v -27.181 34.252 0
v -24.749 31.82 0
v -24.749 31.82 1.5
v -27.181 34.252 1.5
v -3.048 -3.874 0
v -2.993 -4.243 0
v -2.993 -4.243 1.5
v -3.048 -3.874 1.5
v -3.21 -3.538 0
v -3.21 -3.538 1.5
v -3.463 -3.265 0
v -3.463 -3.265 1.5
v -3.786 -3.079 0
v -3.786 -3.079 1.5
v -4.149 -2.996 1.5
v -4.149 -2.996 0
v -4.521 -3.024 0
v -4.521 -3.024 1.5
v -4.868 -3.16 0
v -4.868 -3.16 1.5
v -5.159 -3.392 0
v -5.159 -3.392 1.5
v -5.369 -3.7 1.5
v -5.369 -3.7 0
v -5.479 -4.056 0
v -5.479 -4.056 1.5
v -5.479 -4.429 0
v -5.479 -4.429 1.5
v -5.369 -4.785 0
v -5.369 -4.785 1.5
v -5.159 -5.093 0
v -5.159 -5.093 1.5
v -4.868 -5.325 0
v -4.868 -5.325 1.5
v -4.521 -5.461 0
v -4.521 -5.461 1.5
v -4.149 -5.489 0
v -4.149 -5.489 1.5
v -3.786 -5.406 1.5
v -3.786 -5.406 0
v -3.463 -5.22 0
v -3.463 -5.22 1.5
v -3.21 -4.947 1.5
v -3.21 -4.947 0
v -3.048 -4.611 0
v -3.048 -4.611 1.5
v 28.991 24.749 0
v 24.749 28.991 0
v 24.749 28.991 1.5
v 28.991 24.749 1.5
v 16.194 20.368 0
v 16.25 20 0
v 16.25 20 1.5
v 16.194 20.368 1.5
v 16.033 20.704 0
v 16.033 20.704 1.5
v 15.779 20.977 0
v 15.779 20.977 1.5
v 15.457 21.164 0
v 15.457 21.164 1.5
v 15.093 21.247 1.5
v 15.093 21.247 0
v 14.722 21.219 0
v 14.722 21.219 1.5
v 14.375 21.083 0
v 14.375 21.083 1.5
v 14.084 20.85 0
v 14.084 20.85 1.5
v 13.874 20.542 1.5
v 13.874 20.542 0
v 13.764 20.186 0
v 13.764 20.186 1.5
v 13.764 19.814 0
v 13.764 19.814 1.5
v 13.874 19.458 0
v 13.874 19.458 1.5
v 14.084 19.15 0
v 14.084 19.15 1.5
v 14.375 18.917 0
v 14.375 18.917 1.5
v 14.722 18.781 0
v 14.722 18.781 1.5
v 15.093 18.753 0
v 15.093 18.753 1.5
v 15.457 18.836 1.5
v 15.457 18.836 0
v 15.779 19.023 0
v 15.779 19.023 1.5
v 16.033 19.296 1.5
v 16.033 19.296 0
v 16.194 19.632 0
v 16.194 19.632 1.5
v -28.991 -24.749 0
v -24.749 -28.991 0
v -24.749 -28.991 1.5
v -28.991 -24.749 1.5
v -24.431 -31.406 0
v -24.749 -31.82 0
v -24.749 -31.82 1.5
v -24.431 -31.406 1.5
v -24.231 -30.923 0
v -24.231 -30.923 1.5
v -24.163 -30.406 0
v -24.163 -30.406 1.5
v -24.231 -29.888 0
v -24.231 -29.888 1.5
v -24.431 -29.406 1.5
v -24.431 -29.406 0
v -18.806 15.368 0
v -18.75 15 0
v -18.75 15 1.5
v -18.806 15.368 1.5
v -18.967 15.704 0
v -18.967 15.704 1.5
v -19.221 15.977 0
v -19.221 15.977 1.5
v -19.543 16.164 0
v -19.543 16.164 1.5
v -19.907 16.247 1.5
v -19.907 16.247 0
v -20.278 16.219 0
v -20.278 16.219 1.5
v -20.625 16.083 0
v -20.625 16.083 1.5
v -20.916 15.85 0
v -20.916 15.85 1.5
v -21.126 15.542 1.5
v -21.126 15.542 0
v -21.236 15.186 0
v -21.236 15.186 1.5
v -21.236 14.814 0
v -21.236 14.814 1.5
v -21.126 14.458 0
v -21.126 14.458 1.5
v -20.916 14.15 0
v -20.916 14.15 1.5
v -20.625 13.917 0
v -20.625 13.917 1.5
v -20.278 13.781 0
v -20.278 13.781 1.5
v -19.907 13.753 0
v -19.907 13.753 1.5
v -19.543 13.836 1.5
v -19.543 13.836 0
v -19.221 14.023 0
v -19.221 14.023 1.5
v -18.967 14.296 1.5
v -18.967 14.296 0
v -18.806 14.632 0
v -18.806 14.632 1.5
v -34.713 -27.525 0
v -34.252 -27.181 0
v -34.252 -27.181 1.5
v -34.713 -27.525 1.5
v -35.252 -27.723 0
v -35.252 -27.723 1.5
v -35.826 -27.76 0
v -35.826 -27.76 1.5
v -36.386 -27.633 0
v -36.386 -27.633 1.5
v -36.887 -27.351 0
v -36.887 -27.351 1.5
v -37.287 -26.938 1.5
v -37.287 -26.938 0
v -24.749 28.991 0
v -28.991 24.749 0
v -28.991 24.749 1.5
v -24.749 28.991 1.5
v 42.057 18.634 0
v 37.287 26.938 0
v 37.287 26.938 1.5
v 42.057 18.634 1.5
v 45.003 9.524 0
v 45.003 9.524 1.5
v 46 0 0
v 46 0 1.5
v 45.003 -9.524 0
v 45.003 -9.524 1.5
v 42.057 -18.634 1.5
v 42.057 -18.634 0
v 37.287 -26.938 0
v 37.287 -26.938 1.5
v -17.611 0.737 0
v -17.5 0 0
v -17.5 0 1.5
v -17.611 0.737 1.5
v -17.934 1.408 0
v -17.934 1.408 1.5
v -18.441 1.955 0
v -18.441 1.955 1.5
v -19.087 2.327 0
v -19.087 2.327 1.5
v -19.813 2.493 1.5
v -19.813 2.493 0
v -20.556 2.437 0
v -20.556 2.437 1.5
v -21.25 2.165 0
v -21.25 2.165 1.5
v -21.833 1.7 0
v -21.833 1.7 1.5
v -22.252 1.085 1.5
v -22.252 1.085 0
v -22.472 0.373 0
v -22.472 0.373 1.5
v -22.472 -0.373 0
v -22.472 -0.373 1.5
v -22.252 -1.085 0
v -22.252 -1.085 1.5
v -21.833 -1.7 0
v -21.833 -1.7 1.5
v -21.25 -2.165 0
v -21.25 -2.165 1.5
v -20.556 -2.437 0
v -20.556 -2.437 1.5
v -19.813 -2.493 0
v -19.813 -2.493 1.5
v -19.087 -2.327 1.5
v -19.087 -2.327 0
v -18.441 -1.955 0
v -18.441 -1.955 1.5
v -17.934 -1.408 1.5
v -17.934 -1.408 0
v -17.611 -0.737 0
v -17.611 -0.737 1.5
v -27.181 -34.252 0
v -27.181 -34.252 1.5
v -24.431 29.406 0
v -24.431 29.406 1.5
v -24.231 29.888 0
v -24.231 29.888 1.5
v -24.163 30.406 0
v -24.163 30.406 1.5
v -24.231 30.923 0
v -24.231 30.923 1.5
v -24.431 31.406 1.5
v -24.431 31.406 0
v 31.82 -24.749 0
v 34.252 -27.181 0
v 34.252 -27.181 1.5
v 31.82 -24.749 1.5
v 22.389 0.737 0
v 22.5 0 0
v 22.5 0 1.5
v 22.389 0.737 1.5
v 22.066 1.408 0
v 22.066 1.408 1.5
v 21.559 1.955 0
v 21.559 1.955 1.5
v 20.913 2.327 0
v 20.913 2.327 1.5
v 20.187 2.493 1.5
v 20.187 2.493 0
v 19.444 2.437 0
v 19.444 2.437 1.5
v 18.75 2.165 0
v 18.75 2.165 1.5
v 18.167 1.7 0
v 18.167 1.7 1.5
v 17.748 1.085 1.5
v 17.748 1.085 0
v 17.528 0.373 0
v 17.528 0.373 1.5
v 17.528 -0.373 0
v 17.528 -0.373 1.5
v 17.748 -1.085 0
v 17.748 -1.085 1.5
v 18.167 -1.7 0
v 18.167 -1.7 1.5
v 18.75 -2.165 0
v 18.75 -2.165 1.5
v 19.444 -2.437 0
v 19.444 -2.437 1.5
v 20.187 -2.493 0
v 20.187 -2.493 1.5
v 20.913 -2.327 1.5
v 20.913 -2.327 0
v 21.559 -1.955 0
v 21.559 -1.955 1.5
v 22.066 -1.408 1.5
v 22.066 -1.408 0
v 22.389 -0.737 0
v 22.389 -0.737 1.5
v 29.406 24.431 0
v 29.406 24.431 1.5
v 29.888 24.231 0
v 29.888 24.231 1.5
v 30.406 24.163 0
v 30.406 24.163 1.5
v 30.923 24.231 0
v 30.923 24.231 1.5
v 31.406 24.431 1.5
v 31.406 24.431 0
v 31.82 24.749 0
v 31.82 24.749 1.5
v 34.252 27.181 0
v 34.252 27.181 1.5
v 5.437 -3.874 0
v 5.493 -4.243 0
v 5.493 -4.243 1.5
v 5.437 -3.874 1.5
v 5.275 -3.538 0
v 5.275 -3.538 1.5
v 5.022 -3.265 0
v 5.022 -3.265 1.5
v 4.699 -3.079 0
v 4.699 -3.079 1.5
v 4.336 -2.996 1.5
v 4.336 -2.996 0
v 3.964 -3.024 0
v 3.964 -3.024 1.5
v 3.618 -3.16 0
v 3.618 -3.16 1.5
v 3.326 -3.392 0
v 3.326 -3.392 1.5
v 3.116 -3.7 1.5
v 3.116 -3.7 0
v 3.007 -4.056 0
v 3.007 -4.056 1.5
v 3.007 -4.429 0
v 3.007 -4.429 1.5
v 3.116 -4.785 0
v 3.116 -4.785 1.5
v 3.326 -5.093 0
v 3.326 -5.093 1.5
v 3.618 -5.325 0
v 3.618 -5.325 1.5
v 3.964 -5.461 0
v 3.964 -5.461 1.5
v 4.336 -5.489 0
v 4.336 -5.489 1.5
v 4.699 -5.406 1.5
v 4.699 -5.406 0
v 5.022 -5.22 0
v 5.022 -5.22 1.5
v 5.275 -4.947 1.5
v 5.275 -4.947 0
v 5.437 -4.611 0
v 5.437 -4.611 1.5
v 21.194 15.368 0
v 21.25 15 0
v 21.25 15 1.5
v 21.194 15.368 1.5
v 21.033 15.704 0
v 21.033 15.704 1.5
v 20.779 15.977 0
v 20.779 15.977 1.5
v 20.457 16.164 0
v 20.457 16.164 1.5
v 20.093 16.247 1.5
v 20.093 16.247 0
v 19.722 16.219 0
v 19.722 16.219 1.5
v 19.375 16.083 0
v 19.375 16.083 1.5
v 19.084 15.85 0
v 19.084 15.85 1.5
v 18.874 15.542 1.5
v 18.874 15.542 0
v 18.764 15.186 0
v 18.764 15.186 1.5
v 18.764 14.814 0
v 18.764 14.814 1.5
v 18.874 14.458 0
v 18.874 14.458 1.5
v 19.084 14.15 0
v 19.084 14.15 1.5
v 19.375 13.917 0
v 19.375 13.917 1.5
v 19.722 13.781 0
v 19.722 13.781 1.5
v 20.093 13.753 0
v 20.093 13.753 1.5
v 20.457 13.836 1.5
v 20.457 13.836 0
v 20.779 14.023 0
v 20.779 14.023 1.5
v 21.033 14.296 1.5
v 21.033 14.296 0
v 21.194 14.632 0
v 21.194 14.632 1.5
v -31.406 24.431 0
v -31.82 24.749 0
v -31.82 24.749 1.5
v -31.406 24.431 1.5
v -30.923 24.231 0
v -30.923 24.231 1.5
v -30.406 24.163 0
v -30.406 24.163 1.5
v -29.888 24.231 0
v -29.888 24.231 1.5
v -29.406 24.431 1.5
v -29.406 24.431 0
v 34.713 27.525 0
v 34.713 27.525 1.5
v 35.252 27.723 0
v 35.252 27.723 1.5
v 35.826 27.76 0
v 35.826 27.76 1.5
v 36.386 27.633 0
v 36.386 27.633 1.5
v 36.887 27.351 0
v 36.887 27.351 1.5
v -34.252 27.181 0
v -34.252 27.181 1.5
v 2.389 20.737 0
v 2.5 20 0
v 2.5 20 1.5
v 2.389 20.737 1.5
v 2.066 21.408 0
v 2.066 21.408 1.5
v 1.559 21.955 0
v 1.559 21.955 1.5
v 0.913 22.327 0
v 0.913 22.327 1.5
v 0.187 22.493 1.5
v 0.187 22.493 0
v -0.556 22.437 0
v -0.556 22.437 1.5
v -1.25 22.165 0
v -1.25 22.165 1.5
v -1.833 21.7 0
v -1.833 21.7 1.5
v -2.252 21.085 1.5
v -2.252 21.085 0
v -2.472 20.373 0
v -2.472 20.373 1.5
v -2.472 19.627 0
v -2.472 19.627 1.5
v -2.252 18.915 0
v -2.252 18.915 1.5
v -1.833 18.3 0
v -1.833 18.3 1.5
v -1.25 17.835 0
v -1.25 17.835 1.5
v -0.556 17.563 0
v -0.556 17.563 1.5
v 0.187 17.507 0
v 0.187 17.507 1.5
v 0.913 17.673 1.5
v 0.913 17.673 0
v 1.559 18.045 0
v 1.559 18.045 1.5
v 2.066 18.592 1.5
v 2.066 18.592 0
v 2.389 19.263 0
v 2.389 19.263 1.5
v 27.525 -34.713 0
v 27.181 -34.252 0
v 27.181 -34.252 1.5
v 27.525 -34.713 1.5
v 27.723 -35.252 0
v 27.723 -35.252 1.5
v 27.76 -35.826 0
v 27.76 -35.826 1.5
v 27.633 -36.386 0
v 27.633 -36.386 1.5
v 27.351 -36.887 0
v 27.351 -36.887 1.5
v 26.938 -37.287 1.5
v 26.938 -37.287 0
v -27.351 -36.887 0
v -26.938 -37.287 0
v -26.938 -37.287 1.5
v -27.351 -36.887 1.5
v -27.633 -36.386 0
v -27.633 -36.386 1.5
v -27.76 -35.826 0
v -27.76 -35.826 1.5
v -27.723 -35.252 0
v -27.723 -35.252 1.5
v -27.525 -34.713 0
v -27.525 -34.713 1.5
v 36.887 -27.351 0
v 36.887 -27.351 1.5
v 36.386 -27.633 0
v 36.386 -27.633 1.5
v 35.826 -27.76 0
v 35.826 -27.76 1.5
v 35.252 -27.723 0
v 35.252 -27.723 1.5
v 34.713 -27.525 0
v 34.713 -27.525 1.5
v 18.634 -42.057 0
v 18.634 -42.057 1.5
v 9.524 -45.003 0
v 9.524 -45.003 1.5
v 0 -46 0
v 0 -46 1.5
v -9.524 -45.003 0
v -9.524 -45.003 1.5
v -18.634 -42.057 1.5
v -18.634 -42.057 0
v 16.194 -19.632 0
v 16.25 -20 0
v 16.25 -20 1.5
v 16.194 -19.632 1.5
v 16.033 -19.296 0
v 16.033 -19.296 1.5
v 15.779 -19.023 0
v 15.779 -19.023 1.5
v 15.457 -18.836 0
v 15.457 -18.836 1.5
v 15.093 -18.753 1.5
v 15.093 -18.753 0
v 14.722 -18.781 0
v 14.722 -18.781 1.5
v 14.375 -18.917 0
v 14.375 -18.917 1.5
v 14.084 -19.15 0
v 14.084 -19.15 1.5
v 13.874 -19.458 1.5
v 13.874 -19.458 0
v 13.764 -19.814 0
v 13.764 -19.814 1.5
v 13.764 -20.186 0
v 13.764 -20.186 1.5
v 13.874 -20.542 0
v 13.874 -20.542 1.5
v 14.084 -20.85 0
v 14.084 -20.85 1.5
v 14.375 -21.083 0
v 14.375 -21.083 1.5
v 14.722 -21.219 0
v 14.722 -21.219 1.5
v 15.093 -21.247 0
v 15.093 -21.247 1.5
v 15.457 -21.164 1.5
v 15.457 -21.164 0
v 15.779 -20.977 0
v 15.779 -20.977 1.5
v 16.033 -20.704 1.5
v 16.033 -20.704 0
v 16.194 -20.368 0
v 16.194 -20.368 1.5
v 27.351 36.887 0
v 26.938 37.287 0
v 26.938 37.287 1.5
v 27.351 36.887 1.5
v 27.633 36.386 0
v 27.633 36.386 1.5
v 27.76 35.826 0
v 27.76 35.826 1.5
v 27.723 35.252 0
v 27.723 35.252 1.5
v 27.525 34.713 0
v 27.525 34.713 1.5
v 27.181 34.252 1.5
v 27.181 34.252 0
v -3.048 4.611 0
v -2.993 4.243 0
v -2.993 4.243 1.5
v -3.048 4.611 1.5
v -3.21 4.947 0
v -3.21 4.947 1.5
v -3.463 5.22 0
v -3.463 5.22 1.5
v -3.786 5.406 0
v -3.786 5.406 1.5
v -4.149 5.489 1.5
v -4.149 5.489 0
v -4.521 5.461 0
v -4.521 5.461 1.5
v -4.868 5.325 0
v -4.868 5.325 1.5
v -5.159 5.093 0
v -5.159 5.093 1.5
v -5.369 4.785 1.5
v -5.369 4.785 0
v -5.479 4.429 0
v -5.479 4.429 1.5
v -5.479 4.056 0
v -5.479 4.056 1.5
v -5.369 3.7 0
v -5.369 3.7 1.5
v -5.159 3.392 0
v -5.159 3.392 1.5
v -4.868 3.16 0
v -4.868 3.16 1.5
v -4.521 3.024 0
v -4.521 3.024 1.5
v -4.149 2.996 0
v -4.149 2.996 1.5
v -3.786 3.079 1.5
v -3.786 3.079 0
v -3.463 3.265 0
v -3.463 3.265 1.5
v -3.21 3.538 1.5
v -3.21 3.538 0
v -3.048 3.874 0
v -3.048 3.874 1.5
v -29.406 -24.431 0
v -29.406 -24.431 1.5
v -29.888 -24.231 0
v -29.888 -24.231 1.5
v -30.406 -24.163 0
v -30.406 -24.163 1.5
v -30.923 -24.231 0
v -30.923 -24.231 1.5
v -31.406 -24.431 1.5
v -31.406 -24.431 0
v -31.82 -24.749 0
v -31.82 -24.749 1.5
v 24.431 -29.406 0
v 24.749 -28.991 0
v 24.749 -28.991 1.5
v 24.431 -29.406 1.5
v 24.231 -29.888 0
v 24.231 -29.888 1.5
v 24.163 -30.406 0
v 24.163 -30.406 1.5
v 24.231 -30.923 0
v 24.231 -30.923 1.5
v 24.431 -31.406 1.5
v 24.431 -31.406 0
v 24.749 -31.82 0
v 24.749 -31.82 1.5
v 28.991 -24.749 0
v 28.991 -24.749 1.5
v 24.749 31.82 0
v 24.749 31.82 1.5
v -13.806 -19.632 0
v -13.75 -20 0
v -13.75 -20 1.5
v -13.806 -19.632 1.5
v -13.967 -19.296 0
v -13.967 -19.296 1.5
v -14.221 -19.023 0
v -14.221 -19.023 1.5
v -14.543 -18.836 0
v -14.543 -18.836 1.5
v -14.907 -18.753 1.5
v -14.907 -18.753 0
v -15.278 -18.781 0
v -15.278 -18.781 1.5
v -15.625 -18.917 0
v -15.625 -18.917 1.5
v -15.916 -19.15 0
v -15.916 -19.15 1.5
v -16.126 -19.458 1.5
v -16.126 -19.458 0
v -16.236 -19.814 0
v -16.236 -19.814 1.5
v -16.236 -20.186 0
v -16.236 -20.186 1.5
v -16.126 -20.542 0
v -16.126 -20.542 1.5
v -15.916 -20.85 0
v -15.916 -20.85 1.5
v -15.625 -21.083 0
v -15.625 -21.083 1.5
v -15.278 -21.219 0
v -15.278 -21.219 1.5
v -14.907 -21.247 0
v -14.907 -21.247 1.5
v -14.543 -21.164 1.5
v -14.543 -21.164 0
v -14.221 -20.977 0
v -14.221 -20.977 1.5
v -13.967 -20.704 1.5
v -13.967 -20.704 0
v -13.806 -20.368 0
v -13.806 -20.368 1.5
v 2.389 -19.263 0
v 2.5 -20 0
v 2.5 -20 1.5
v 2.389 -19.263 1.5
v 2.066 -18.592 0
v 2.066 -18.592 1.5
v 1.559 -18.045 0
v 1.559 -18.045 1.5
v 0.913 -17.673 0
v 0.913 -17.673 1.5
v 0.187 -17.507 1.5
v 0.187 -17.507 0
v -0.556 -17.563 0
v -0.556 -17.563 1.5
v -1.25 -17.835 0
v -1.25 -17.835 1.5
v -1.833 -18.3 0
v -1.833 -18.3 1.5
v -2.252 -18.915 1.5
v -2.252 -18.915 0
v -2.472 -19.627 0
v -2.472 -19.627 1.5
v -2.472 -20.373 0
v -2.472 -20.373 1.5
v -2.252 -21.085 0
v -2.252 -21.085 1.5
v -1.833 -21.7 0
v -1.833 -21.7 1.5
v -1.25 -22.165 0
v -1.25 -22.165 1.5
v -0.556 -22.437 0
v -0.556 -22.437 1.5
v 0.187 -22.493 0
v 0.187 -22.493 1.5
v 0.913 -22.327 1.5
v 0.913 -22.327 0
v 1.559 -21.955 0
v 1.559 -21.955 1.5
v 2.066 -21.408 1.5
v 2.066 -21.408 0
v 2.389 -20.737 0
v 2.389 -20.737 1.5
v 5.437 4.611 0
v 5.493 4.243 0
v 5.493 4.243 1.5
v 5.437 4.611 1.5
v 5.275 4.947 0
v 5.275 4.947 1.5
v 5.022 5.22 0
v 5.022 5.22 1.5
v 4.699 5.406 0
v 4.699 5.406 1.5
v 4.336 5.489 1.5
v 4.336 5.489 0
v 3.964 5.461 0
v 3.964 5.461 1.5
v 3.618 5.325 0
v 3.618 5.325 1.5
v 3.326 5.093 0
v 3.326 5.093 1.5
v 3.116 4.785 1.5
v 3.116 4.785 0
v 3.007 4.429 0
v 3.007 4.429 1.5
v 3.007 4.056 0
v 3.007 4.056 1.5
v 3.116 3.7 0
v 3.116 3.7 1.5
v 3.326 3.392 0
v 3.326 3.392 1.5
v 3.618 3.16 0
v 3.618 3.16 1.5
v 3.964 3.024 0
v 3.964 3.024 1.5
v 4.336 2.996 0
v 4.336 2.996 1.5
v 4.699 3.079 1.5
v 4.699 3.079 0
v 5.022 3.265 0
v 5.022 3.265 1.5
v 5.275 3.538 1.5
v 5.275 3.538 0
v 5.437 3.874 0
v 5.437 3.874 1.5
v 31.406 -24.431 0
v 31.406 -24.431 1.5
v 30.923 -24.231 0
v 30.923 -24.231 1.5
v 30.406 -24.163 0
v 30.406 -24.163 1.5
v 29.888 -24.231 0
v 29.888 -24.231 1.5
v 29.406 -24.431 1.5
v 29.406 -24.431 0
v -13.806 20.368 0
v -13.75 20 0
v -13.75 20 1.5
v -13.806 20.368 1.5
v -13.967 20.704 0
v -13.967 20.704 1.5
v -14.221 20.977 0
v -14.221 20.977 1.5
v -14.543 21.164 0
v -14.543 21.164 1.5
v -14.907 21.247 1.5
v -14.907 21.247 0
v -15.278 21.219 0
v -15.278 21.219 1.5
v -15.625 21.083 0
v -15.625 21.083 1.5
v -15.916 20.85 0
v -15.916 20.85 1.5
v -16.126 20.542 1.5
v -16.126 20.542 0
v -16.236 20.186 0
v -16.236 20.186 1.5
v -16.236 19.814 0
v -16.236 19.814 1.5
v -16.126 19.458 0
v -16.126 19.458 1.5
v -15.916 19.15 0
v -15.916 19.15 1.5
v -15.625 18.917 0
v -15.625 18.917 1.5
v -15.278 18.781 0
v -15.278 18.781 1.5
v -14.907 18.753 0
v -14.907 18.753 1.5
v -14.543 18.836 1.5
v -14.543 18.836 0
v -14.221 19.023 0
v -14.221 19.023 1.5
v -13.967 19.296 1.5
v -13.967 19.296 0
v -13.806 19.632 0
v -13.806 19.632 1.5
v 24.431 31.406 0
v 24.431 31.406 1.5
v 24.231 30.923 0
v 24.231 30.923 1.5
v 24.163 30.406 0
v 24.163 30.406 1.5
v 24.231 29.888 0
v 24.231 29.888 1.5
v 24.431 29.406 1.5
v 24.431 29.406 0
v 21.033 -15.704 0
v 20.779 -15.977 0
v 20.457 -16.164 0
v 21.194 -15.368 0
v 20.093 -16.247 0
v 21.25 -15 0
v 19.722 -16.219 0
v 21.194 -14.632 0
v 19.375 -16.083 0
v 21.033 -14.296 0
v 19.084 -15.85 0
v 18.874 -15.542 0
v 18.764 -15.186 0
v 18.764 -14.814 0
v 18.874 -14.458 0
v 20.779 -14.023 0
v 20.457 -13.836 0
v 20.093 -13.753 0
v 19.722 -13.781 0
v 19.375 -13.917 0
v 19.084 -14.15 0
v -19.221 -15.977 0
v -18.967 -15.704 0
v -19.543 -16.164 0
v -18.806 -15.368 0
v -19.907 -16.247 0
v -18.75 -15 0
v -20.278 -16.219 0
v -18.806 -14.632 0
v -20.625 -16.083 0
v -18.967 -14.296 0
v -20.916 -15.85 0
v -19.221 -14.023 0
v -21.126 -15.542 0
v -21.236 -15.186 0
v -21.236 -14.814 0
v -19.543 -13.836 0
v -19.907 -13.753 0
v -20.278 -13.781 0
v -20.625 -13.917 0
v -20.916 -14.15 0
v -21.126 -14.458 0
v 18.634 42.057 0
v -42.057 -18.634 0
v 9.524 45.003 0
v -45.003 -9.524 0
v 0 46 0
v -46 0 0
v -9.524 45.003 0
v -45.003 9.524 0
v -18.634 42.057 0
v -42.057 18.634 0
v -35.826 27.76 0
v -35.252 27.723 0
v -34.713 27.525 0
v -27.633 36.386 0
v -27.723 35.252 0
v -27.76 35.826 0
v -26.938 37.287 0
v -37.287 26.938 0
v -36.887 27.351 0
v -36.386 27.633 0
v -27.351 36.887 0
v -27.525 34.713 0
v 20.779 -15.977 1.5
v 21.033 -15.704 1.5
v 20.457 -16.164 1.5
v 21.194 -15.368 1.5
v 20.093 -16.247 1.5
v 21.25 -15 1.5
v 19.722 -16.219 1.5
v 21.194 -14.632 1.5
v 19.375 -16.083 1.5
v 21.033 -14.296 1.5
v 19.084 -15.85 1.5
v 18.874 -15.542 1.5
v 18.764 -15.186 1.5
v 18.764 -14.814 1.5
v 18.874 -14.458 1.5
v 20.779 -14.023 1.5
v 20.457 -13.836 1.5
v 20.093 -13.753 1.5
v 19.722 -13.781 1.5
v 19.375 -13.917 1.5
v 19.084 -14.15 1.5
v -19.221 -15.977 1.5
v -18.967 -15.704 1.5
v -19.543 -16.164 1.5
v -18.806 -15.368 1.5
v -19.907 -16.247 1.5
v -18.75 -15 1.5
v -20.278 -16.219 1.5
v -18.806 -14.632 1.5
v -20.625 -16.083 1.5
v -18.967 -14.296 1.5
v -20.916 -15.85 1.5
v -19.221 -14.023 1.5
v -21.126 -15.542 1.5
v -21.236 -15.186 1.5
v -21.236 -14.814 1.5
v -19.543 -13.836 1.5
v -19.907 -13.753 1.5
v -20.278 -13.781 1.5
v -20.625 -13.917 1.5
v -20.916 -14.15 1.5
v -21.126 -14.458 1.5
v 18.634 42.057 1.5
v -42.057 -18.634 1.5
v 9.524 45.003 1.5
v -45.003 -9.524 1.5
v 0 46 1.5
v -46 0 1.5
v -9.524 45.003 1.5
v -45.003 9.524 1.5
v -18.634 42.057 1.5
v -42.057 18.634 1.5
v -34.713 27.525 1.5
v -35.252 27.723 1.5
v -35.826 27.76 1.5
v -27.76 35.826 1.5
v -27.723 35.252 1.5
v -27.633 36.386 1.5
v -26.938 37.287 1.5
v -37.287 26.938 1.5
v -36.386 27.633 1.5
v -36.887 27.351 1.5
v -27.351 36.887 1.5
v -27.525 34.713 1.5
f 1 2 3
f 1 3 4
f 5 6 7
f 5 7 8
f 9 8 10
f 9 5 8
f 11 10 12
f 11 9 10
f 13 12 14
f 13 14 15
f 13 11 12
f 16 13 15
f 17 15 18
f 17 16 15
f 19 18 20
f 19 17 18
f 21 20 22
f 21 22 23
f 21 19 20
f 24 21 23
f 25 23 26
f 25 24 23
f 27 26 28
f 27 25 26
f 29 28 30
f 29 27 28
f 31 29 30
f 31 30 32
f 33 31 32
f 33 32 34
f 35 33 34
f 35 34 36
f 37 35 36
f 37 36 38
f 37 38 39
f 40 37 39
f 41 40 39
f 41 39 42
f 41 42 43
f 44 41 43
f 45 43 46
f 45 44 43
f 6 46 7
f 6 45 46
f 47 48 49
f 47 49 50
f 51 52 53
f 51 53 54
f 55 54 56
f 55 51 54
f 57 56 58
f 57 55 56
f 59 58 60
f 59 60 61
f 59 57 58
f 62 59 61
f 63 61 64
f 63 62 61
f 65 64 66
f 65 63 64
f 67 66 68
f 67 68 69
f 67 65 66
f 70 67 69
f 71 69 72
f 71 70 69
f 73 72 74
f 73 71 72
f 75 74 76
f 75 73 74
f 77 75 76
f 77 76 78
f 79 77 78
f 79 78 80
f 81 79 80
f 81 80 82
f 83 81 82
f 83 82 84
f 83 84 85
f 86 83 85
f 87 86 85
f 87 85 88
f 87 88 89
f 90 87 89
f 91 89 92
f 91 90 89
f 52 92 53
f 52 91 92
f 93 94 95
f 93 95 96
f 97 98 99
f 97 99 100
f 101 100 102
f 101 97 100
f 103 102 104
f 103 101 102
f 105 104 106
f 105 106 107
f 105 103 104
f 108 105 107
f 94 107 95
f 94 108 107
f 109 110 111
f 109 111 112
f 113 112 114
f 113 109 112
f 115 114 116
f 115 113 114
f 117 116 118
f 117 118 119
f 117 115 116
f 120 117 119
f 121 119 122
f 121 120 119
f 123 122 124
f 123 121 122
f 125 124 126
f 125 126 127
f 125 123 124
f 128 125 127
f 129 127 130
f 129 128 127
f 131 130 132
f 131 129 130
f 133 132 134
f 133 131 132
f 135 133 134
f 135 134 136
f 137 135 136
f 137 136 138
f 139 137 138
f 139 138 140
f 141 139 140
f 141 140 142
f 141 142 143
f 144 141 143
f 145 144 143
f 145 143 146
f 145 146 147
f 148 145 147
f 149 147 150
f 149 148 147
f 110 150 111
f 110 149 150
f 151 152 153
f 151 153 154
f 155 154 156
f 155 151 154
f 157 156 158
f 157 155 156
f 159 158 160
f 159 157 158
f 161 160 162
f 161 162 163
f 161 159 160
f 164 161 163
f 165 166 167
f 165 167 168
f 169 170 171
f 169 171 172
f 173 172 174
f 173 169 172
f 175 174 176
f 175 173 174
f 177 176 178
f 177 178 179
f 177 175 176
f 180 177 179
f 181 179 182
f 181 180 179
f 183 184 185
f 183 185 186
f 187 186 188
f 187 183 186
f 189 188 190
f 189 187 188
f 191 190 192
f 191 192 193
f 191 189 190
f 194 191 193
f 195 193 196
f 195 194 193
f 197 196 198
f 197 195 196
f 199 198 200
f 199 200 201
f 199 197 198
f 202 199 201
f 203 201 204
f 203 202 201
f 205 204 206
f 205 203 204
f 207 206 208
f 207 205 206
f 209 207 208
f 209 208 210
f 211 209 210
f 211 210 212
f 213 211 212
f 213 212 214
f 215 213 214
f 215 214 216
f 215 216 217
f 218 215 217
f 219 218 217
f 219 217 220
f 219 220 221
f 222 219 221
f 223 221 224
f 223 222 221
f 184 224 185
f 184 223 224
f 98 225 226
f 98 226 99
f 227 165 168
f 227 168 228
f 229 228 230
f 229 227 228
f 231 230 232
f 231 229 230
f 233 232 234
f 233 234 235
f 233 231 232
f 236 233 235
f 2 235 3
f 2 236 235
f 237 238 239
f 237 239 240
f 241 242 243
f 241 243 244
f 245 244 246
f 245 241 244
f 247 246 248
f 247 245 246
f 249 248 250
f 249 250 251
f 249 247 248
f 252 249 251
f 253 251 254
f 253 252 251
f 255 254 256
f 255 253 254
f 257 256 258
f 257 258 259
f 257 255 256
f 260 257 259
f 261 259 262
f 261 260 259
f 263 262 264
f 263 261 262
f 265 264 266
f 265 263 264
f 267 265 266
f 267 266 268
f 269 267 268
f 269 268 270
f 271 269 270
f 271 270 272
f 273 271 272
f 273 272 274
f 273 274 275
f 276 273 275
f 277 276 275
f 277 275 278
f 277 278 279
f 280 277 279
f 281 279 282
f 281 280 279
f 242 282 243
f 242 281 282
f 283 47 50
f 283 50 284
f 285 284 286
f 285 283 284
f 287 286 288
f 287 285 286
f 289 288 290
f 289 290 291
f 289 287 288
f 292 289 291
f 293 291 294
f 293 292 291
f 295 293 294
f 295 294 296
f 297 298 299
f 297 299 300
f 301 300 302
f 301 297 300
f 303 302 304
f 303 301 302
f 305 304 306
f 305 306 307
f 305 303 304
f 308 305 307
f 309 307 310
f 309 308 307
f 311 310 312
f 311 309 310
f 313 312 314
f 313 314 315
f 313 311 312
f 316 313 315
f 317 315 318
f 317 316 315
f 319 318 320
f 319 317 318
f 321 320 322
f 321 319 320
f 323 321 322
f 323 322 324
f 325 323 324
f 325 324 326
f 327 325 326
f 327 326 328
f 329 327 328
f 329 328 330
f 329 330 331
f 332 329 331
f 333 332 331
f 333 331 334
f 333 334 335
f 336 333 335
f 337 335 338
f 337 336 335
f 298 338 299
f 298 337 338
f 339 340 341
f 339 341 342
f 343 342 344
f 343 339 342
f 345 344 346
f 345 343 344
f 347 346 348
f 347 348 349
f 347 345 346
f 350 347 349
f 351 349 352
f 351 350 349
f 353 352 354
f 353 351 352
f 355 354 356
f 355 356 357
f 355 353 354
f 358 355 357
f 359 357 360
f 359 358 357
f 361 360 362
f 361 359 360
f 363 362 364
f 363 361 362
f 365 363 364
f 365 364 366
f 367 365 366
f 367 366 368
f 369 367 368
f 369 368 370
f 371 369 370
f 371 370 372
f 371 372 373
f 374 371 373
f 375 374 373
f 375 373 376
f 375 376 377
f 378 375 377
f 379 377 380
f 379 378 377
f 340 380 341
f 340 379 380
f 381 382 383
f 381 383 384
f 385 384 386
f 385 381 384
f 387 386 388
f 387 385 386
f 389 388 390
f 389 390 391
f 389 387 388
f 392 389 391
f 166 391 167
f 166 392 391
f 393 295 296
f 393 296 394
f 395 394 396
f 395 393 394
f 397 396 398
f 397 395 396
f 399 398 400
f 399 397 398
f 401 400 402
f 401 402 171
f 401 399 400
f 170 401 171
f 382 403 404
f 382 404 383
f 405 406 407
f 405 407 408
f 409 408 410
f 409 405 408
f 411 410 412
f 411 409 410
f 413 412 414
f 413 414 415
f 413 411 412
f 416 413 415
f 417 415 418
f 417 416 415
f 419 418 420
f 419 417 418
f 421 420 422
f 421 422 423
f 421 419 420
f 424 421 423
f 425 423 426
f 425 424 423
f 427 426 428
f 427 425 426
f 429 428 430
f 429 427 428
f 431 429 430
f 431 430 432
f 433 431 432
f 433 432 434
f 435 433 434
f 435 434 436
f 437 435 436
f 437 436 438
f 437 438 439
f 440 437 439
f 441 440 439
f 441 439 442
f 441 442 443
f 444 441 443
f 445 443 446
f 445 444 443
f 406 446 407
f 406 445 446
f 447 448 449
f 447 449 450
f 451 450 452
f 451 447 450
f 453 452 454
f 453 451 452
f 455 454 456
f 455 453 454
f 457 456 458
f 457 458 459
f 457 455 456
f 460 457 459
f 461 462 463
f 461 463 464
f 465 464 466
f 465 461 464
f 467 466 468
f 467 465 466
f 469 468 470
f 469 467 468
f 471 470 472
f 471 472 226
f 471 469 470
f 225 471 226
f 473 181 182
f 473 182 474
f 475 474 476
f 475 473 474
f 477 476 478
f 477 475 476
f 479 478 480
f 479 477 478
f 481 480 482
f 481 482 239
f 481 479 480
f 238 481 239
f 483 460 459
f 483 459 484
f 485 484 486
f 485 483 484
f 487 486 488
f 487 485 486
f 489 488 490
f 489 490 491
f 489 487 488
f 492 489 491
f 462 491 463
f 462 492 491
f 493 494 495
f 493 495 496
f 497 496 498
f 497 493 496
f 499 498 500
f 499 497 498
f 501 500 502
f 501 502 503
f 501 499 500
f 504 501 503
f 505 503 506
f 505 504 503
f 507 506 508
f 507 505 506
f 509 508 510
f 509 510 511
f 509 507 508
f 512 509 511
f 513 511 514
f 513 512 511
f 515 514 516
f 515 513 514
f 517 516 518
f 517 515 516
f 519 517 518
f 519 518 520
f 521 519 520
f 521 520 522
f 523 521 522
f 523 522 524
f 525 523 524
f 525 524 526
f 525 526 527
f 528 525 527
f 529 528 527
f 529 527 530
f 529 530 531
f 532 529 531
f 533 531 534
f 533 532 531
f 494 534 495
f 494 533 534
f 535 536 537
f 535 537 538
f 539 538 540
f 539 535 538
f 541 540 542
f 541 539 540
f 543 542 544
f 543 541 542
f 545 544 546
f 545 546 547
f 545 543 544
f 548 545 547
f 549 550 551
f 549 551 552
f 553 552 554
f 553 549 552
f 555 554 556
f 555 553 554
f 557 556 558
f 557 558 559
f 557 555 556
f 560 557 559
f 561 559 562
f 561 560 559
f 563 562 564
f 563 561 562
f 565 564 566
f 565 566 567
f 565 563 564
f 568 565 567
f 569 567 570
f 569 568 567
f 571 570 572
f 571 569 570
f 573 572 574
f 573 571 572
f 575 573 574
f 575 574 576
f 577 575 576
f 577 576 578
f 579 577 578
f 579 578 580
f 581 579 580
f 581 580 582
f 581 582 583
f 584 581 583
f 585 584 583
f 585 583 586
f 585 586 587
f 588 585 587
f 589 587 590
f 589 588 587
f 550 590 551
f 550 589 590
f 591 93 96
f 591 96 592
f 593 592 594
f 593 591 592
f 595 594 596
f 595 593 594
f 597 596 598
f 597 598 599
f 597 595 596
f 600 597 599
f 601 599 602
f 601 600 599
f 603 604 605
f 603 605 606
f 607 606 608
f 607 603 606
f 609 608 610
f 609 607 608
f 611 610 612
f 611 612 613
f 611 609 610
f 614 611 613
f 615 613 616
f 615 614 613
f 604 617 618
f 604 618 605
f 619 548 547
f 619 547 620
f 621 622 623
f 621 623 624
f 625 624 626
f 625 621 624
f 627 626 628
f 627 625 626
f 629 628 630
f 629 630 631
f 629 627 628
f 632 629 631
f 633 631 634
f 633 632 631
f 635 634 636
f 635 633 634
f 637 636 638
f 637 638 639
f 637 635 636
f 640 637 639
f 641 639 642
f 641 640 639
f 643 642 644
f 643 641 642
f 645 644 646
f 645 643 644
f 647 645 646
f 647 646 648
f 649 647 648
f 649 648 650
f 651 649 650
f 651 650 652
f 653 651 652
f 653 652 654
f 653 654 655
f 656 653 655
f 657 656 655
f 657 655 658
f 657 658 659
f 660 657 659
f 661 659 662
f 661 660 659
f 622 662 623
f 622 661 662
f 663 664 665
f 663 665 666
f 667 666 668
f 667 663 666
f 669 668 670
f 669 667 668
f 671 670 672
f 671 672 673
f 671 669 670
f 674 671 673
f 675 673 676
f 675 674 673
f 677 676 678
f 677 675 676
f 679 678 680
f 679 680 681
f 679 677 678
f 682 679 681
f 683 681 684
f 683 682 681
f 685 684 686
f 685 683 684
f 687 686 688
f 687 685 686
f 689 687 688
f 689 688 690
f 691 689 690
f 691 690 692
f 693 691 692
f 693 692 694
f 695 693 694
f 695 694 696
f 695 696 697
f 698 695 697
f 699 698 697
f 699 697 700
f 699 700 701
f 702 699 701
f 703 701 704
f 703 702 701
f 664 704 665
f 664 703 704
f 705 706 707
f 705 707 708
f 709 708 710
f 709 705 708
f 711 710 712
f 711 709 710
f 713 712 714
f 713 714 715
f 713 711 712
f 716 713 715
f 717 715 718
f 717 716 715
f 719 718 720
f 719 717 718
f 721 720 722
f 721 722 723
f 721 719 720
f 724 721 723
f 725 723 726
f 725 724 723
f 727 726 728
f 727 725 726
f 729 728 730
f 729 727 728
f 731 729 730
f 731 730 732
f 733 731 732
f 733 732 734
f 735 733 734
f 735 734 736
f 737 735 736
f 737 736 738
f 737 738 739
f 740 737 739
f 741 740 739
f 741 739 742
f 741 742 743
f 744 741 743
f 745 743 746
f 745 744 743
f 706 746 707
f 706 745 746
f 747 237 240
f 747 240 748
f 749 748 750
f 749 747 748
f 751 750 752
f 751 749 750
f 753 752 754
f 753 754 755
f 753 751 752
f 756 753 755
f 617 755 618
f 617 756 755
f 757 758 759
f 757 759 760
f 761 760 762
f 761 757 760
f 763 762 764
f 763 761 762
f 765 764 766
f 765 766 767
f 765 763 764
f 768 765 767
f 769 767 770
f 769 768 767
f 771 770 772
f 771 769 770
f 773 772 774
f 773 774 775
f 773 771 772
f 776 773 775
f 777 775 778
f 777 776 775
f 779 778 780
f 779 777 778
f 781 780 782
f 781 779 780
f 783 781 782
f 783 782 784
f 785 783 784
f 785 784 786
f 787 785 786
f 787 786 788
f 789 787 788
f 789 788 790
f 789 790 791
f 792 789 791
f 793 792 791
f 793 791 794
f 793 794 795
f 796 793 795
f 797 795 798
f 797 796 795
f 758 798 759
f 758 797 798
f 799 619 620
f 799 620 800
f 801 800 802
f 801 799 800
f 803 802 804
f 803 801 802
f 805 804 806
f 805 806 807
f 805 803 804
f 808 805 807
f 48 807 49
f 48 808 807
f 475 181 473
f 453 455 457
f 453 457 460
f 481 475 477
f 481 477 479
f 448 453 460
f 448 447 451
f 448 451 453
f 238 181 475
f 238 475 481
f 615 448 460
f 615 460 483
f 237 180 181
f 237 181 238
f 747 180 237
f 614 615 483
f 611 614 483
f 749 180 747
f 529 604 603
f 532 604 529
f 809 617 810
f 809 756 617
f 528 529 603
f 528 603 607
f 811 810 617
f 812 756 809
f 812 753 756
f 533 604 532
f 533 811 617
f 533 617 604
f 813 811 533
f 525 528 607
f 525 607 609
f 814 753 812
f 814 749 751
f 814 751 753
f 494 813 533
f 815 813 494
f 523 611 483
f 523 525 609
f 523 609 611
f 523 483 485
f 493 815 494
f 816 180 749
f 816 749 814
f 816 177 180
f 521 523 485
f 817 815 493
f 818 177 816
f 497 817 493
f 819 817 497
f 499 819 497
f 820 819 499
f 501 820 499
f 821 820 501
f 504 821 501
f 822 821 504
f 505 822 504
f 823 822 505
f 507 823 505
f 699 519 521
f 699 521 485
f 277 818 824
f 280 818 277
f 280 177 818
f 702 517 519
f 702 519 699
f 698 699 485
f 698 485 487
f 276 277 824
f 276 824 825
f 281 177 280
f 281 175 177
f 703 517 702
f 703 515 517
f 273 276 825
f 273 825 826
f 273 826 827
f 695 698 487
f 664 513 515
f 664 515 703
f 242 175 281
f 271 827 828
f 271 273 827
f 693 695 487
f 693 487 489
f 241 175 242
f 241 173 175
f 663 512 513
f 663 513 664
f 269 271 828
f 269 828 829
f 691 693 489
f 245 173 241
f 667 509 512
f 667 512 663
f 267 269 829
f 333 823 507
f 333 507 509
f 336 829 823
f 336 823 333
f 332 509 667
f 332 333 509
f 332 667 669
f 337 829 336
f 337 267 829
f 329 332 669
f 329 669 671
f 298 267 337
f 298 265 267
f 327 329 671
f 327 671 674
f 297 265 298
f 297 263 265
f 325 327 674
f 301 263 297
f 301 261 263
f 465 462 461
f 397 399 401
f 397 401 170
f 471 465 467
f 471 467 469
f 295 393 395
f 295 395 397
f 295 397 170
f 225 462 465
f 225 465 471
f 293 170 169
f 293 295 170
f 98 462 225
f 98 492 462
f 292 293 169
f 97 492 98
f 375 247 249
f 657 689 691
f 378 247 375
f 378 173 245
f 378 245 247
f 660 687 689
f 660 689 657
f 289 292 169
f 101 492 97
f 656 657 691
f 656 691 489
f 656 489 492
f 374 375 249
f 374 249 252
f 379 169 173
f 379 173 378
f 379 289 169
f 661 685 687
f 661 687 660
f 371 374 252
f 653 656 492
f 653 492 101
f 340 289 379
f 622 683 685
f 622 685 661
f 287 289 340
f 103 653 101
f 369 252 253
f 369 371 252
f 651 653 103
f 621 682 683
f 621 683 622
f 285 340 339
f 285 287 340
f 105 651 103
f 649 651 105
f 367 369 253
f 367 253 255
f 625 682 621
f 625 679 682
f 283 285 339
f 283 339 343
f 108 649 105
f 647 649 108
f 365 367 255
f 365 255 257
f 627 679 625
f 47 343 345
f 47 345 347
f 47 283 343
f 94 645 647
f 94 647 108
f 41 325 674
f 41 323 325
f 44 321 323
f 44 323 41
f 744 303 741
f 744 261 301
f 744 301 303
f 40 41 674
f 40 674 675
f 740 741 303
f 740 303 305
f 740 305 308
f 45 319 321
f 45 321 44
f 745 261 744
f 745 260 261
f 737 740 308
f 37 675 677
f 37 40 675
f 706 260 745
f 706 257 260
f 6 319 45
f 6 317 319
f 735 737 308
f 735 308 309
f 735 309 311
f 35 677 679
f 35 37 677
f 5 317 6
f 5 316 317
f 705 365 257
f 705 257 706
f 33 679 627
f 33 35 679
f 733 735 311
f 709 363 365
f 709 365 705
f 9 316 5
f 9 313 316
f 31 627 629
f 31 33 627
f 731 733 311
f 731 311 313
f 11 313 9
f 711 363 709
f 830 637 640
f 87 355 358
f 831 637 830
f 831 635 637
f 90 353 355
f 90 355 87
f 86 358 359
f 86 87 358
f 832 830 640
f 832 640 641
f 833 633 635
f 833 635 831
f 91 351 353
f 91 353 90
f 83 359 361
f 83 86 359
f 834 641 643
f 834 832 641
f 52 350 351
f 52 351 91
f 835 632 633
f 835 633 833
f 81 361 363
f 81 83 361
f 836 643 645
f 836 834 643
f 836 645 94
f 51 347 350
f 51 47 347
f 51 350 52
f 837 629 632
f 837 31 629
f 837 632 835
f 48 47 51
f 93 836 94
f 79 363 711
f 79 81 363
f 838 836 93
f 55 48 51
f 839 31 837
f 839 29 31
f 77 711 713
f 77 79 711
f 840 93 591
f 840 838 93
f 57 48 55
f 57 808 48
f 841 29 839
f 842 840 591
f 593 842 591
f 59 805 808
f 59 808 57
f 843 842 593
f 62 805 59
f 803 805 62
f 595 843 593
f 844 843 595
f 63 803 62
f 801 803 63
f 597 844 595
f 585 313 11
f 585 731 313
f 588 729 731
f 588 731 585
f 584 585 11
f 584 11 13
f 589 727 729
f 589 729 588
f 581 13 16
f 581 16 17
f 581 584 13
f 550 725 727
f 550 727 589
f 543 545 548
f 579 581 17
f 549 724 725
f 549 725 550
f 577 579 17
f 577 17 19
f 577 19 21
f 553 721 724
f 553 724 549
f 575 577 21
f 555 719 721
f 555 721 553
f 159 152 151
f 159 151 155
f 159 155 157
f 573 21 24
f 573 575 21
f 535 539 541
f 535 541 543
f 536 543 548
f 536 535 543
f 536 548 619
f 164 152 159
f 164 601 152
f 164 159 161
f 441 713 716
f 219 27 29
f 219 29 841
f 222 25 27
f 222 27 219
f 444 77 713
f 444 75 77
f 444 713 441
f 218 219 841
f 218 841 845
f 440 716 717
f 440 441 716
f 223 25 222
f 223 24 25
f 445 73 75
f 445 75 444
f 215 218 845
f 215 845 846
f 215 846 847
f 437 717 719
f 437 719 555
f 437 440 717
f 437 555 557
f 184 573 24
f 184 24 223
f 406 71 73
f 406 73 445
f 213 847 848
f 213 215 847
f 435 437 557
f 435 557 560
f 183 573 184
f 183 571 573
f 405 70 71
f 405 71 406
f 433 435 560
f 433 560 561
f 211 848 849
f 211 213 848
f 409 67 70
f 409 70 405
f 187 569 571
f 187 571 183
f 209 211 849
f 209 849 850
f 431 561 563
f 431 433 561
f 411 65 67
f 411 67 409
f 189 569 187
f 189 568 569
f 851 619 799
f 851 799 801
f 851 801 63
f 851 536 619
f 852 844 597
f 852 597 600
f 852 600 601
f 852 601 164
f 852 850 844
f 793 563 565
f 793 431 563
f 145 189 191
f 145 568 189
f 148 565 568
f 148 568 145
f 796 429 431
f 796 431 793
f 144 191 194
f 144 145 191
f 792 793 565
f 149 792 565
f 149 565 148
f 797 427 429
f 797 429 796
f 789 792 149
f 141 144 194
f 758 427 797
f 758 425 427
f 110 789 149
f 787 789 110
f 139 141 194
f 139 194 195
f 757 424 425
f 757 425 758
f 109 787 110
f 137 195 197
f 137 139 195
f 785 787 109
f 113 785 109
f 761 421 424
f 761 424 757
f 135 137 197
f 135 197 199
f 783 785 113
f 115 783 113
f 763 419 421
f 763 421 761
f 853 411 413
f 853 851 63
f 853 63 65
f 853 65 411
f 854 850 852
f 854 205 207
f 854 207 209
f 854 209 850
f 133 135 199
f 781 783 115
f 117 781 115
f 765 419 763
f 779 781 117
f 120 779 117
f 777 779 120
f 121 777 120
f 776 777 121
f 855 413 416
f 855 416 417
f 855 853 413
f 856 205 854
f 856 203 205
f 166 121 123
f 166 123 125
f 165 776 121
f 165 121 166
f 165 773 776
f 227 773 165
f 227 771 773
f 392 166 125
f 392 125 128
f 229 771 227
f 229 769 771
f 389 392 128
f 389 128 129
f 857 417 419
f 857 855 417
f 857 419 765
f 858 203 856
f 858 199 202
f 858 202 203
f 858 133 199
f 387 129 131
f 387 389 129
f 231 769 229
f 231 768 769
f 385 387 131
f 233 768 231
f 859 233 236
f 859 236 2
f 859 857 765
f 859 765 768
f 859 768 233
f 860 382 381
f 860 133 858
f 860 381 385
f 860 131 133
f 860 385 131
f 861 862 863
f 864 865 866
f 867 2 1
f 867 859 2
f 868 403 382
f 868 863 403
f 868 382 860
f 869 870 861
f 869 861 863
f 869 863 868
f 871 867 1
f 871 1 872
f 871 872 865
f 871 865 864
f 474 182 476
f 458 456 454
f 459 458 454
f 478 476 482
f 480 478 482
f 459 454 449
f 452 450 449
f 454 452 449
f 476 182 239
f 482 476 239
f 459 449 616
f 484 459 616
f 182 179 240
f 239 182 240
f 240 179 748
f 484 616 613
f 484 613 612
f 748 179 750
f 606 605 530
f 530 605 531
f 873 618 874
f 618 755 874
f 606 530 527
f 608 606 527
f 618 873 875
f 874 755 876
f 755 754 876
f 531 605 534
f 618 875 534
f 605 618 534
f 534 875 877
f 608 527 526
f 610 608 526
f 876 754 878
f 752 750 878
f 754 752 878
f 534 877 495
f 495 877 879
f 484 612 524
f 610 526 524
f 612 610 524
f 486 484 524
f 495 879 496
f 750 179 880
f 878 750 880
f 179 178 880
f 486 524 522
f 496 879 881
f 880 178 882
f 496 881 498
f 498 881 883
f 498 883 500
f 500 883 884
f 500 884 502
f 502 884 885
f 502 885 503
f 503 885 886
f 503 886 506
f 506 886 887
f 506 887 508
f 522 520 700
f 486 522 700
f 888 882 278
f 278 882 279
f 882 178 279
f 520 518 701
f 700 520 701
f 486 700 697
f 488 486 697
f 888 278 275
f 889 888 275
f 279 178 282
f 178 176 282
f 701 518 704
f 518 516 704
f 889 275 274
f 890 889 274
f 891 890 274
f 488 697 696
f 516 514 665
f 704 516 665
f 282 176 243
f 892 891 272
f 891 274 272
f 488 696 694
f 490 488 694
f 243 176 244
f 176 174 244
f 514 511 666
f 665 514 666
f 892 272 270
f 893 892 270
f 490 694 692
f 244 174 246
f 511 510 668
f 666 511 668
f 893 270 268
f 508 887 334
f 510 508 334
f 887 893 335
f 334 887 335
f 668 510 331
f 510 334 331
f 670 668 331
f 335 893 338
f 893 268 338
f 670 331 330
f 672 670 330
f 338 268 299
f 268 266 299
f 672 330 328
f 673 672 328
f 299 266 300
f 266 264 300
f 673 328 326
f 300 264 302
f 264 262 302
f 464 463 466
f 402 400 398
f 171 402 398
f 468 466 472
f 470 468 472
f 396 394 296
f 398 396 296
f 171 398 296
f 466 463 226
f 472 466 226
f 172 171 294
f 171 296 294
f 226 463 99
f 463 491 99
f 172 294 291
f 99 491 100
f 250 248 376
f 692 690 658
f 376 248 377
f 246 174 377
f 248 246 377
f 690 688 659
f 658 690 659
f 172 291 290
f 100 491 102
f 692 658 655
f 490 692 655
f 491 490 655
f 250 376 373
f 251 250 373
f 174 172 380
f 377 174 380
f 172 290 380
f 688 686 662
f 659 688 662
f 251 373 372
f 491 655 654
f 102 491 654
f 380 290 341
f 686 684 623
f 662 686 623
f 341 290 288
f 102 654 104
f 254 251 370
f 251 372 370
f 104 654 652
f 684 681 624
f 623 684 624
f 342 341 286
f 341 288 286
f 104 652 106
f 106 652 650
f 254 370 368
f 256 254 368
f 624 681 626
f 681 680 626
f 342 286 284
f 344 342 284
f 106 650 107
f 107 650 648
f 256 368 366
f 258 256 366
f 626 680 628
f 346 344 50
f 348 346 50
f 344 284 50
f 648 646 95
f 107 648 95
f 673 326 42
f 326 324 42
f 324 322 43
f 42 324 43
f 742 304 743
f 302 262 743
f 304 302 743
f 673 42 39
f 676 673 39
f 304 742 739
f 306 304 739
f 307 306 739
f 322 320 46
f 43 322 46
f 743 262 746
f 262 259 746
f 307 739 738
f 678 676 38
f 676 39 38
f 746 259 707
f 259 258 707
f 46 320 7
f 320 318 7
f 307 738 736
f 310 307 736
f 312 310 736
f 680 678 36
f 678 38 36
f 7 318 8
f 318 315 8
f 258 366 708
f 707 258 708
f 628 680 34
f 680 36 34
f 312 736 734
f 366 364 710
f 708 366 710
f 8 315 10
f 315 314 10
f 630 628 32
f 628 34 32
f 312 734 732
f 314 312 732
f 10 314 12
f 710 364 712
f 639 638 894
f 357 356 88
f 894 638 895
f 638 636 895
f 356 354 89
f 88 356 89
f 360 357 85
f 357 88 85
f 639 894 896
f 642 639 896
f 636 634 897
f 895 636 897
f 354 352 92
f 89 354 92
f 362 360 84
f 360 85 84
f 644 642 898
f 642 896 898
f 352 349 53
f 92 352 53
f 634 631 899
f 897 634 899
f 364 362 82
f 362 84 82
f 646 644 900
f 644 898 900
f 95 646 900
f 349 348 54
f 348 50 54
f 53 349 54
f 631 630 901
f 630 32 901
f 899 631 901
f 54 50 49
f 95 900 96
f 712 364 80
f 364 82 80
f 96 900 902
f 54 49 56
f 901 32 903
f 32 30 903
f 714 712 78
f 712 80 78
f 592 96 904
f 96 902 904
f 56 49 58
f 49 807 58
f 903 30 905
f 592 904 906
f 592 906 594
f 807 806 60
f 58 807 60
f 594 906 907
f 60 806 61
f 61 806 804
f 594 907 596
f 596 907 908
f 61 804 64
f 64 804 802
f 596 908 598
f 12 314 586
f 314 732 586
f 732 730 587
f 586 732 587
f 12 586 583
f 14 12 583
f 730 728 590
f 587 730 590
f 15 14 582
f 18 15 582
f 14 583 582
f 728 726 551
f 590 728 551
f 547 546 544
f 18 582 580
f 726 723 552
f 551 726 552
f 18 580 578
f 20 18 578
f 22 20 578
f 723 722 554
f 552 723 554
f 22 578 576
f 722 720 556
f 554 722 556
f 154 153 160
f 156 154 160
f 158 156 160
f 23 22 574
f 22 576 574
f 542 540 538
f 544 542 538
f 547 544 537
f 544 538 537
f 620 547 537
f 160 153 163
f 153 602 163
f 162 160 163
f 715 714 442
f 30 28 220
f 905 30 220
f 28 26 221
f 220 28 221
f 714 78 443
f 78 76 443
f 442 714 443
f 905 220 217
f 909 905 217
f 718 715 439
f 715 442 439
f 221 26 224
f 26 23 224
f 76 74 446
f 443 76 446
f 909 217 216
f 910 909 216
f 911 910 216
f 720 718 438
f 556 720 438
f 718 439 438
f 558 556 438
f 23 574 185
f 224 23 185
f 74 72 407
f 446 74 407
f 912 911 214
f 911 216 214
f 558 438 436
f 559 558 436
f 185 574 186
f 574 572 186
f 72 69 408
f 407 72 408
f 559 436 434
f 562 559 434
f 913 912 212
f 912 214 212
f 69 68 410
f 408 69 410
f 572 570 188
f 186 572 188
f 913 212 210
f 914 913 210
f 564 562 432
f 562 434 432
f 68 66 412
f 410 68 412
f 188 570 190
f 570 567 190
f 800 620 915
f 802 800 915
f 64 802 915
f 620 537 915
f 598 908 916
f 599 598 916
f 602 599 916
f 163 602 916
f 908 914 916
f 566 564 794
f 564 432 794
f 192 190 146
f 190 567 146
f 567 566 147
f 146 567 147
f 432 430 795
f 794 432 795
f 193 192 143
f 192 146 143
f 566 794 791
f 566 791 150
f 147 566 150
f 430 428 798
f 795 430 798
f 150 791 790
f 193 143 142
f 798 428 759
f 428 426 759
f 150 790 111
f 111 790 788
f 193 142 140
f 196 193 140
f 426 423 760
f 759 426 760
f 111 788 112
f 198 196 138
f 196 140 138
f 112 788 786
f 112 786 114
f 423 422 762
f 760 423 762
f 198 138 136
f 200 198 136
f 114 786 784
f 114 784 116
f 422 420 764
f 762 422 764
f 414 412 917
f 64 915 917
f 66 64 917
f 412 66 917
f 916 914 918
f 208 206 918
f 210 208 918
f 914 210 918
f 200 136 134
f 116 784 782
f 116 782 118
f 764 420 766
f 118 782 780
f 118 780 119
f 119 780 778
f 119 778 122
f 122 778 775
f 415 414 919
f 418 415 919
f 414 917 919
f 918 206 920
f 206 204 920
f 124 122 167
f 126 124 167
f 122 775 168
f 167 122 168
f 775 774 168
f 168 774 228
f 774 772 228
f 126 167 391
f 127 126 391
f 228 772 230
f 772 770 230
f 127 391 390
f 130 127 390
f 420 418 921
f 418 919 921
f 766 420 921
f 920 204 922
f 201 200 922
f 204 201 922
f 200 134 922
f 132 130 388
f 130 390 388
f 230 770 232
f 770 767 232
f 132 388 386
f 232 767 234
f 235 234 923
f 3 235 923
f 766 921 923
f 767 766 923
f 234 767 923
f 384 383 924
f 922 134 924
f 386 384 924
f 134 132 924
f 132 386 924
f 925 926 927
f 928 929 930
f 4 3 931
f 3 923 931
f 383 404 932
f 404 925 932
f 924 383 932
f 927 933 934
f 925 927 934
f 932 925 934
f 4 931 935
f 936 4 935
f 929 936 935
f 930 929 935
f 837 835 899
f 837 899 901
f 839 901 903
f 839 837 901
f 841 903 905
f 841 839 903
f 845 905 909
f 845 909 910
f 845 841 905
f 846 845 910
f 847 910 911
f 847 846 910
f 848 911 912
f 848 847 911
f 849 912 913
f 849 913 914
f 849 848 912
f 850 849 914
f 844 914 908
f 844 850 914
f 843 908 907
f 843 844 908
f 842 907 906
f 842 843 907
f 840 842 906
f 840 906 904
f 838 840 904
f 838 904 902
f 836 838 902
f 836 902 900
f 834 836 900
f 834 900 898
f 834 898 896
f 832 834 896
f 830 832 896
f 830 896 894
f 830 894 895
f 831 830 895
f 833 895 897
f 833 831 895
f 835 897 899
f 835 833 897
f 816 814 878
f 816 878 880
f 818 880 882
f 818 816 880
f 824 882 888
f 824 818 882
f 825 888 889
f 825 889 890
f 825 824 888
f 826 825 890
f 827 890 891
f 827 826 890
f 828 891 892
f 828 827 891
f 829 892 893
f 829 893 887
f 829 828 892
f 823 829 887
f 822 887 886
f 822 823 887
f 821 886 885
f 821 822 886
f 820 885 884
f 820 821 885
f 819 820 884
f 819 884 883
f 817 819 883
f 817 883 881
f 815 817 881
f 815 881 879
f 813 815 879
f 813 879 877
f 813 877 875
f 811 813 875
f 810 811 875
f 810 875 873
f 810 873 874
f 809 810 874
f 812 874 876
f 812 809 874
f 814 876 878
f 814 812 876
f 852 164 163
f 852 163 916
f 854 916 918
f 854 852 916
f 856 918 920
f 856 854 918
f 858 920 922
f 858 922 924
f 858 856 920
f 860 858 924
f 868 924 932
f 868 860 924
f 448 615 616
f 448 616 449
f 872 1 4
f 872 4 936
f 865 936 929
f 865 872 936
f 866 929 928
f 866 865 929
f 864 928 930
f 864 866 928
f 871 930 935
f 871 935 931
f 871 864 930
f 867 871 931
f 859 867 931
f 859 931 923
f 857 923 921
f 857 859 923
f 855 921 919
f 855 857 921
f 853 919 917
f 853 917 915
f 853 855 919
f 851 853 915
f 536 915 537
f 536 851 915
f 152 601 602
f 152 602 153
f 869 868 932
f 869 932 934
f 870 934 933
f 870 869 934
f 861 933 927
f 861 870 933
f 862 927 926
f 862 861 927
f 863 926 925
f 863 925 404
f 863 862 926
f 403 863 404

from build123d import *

# Parameters (mm, degrees)
SKETCH5_R           = 2.5
SKETCH5_R_2         = 1.25
BOSS_EXTRUDE1_DEPTH = 1.5


with BuildPart() as part:
    # Sketch5 → Boss-Extrude1 (new body)
    with BuildSketch(Plane.XY):
        with BuildLine():
            Line((-34.251979013, 27.180911201), (-31.819805153, 24.748737342))
            ThreePointArc((-31.819805153, 24.748737342), (-30.405591591, 24.162950904), (-28.991378029, 24.748737342))
            Line((-28.991378029, 24.748737342), (-24.748737342, 28.991378029))
            ThreePointArc((-24.748737342, 28.991378029), (-24.162950904, 30.405591591), (-24.748737342, 31.819805153))
            Line((-24.748737342, 31.819805153), (-27.180911201, 34.251979013))
            ThreePointArc((-27.180911201, 34.251979013), (-27.760319437, 35.825792464), (-26.937911168, 37.287383147))
            ThreePointArc((-26.937911168, 37.287383147), (0, 46), (26.937911168, 37.287383147))
            ThreePointArc((26.937911168, 37.287383147), (27.760319437, 35.825792464), (27.180911201, 34.251979013))
            Line((27.180911201, 34.251979013), (24.748737342, 31.819805153))
            ThreePointArc((24.748737342, 31.819805153), (24.162950904, 30.405591591), (24.748737342, 28.991378029))
            Line((24.748737342, 28.991378029), (28.991378029, 24.748737342))
            ThreePointArc((28.991378029, 24.748737342), (30.405591591, 24.162950904), (31.819805153, 24.748737342))
            Line((31.819805153, 24.748737342), (34.251979013, 27.180911201))
            ThreePointArc((34.251979013, 27.180911201), (35.825792464, 27.760319437), (37.287383147, 26.937911168))
            ThreePointArc((37.287383147, 26.937911168), (46, 0), (37.287383147, -26.937911168))
            ThreePointArc((37.287383147, -26.937911168), (35.825792464, -27.760319437), (34.251979013, -27.180911201))
            Line((34.251979013, -27.180911201), (31.819805153, -24.748737342))
            ThreePointArc((31.819805153, -24.748737342), (30.405591591, -24.162950904), (28.991378029, -24.748737342))
            Line((28.991378029, -24.748737342), (24.748737342, -28.991378029))
            ThreePointArc((24.748737342, -28.991378029), (24.162950904, -30.405591591), (24.748737342, -31.819805153))
            Line((24.748737342, -31.819805153), (27.180911201, -34.251979013))
            ThreePointArc((27.180911201, -34.251979013), (27.760319437, -35.825792464), (26.937911168, -37.287383147))
            ThreePointArc((26.937911168, -37.287383147), (0, -46), (-26.937911168, -37.287383147))
            ThreePointArc((-26.937911168, -37.287383147), (-27.760319437, -35.825792464), (-27.180911201, -34.251979013))
            Line((-27.180911201, -34.251979013), (-24.748737342, -31.819805153))
            ThreePointArc((-24.748737342, -31.819805153), (-24.162950904, -30.405591591), (-24.748737342, -28.991378029))
            Line((-24.748737342, -28.991378029), (-28.991378029, -24.748737342))
            ThreePointArc((-28.991378029, -24.748737342), (-30.405591591, -24.162950904), (-31.819805153, -24.748737342))
            Line((-31.819805153, -24.748737342), (-34.251979013, -27.180911201))
            ThreePointArc((-34.251979013, -27.180911201), (-35.825792464, -27.760319437), (-37.287383147, -26.937911168))
            ThreePointArc((-37.287383147, -26.937911168), (-46, 0), (-37.287383147, 26.937911168))
            ThreePointArc((-37.287383147, 26.937911168), (-35.825792464, 27.760319437), (-34.251979013, 27.180911201))
        make_face()
        with Locations((-20, 0)):
            Circle(SKETCH5_R, mode=Mode.SUBTRACT)
        with Locations((-20, 15)):
            Circle(SKETCH5_R_2, mode=Mode.SUBTRACT)
        with Locations((-20, -15)):
            Circle(SKETCH5_R_2, mode=Mode.SUBTRACT)
        with Locations((-15, -20)):
            Circle(SKETCH5_R_2, mode=Mode.SUBTRACT)
        with Locations((0, -20)):
            Circle(SKETCH5_R, mode=Mode.SUBTRACT)
        with Locations((15, -20)):
            Circle(SKETCH5_R_2, mode=Mode.SUBTRACT)
        with Locations((20, -15)):
            Circle(SKETCH5_R_2, mode=Mode.SUBTRACT)
        with Locations((20, 0)):
            Circle(SKETCH5_R, mode=Mode.SUBTRACT)
        with Locations((20, 15)):
            Circle(SKETCH5_R_2, mode=Mode.SUBTRACT)
        with Locations((15, 20)):
            Circle(SKETCH5_R_2, mode=Mode.SUBTRACT)
        with Locations((0, 20)):
            Circle(SKETCH5_R, mode=Mode.SUBTRACT)
        with Locations((-15, 20)):
            Circle(SKETCH5_R_2, mode=Mode.SUBTRACT)
        with Locations((4.242640687, 4.242640687)):
            Circle(SKETCH5_R_2, mode=Mode.SUBTRACT)
        with Locations((-4.242640687, 4.242640687)):
            Circle(SKETCH5_R_2, mode=Mode.SUBTRACT)
        with Locations((-4.242640687, -4.242640687)):
            Circle(SKETCH5_R_2, mode=Mode.SUBTRACT)
        with Locations((4.242640687, -4.242640687)):
            Circle(SKETCH5_R_2, mode=Mode.SUBTRACT)
    extrude(amount=BOSS_EXTRUDE1_DEPTH)


solid = part.part
